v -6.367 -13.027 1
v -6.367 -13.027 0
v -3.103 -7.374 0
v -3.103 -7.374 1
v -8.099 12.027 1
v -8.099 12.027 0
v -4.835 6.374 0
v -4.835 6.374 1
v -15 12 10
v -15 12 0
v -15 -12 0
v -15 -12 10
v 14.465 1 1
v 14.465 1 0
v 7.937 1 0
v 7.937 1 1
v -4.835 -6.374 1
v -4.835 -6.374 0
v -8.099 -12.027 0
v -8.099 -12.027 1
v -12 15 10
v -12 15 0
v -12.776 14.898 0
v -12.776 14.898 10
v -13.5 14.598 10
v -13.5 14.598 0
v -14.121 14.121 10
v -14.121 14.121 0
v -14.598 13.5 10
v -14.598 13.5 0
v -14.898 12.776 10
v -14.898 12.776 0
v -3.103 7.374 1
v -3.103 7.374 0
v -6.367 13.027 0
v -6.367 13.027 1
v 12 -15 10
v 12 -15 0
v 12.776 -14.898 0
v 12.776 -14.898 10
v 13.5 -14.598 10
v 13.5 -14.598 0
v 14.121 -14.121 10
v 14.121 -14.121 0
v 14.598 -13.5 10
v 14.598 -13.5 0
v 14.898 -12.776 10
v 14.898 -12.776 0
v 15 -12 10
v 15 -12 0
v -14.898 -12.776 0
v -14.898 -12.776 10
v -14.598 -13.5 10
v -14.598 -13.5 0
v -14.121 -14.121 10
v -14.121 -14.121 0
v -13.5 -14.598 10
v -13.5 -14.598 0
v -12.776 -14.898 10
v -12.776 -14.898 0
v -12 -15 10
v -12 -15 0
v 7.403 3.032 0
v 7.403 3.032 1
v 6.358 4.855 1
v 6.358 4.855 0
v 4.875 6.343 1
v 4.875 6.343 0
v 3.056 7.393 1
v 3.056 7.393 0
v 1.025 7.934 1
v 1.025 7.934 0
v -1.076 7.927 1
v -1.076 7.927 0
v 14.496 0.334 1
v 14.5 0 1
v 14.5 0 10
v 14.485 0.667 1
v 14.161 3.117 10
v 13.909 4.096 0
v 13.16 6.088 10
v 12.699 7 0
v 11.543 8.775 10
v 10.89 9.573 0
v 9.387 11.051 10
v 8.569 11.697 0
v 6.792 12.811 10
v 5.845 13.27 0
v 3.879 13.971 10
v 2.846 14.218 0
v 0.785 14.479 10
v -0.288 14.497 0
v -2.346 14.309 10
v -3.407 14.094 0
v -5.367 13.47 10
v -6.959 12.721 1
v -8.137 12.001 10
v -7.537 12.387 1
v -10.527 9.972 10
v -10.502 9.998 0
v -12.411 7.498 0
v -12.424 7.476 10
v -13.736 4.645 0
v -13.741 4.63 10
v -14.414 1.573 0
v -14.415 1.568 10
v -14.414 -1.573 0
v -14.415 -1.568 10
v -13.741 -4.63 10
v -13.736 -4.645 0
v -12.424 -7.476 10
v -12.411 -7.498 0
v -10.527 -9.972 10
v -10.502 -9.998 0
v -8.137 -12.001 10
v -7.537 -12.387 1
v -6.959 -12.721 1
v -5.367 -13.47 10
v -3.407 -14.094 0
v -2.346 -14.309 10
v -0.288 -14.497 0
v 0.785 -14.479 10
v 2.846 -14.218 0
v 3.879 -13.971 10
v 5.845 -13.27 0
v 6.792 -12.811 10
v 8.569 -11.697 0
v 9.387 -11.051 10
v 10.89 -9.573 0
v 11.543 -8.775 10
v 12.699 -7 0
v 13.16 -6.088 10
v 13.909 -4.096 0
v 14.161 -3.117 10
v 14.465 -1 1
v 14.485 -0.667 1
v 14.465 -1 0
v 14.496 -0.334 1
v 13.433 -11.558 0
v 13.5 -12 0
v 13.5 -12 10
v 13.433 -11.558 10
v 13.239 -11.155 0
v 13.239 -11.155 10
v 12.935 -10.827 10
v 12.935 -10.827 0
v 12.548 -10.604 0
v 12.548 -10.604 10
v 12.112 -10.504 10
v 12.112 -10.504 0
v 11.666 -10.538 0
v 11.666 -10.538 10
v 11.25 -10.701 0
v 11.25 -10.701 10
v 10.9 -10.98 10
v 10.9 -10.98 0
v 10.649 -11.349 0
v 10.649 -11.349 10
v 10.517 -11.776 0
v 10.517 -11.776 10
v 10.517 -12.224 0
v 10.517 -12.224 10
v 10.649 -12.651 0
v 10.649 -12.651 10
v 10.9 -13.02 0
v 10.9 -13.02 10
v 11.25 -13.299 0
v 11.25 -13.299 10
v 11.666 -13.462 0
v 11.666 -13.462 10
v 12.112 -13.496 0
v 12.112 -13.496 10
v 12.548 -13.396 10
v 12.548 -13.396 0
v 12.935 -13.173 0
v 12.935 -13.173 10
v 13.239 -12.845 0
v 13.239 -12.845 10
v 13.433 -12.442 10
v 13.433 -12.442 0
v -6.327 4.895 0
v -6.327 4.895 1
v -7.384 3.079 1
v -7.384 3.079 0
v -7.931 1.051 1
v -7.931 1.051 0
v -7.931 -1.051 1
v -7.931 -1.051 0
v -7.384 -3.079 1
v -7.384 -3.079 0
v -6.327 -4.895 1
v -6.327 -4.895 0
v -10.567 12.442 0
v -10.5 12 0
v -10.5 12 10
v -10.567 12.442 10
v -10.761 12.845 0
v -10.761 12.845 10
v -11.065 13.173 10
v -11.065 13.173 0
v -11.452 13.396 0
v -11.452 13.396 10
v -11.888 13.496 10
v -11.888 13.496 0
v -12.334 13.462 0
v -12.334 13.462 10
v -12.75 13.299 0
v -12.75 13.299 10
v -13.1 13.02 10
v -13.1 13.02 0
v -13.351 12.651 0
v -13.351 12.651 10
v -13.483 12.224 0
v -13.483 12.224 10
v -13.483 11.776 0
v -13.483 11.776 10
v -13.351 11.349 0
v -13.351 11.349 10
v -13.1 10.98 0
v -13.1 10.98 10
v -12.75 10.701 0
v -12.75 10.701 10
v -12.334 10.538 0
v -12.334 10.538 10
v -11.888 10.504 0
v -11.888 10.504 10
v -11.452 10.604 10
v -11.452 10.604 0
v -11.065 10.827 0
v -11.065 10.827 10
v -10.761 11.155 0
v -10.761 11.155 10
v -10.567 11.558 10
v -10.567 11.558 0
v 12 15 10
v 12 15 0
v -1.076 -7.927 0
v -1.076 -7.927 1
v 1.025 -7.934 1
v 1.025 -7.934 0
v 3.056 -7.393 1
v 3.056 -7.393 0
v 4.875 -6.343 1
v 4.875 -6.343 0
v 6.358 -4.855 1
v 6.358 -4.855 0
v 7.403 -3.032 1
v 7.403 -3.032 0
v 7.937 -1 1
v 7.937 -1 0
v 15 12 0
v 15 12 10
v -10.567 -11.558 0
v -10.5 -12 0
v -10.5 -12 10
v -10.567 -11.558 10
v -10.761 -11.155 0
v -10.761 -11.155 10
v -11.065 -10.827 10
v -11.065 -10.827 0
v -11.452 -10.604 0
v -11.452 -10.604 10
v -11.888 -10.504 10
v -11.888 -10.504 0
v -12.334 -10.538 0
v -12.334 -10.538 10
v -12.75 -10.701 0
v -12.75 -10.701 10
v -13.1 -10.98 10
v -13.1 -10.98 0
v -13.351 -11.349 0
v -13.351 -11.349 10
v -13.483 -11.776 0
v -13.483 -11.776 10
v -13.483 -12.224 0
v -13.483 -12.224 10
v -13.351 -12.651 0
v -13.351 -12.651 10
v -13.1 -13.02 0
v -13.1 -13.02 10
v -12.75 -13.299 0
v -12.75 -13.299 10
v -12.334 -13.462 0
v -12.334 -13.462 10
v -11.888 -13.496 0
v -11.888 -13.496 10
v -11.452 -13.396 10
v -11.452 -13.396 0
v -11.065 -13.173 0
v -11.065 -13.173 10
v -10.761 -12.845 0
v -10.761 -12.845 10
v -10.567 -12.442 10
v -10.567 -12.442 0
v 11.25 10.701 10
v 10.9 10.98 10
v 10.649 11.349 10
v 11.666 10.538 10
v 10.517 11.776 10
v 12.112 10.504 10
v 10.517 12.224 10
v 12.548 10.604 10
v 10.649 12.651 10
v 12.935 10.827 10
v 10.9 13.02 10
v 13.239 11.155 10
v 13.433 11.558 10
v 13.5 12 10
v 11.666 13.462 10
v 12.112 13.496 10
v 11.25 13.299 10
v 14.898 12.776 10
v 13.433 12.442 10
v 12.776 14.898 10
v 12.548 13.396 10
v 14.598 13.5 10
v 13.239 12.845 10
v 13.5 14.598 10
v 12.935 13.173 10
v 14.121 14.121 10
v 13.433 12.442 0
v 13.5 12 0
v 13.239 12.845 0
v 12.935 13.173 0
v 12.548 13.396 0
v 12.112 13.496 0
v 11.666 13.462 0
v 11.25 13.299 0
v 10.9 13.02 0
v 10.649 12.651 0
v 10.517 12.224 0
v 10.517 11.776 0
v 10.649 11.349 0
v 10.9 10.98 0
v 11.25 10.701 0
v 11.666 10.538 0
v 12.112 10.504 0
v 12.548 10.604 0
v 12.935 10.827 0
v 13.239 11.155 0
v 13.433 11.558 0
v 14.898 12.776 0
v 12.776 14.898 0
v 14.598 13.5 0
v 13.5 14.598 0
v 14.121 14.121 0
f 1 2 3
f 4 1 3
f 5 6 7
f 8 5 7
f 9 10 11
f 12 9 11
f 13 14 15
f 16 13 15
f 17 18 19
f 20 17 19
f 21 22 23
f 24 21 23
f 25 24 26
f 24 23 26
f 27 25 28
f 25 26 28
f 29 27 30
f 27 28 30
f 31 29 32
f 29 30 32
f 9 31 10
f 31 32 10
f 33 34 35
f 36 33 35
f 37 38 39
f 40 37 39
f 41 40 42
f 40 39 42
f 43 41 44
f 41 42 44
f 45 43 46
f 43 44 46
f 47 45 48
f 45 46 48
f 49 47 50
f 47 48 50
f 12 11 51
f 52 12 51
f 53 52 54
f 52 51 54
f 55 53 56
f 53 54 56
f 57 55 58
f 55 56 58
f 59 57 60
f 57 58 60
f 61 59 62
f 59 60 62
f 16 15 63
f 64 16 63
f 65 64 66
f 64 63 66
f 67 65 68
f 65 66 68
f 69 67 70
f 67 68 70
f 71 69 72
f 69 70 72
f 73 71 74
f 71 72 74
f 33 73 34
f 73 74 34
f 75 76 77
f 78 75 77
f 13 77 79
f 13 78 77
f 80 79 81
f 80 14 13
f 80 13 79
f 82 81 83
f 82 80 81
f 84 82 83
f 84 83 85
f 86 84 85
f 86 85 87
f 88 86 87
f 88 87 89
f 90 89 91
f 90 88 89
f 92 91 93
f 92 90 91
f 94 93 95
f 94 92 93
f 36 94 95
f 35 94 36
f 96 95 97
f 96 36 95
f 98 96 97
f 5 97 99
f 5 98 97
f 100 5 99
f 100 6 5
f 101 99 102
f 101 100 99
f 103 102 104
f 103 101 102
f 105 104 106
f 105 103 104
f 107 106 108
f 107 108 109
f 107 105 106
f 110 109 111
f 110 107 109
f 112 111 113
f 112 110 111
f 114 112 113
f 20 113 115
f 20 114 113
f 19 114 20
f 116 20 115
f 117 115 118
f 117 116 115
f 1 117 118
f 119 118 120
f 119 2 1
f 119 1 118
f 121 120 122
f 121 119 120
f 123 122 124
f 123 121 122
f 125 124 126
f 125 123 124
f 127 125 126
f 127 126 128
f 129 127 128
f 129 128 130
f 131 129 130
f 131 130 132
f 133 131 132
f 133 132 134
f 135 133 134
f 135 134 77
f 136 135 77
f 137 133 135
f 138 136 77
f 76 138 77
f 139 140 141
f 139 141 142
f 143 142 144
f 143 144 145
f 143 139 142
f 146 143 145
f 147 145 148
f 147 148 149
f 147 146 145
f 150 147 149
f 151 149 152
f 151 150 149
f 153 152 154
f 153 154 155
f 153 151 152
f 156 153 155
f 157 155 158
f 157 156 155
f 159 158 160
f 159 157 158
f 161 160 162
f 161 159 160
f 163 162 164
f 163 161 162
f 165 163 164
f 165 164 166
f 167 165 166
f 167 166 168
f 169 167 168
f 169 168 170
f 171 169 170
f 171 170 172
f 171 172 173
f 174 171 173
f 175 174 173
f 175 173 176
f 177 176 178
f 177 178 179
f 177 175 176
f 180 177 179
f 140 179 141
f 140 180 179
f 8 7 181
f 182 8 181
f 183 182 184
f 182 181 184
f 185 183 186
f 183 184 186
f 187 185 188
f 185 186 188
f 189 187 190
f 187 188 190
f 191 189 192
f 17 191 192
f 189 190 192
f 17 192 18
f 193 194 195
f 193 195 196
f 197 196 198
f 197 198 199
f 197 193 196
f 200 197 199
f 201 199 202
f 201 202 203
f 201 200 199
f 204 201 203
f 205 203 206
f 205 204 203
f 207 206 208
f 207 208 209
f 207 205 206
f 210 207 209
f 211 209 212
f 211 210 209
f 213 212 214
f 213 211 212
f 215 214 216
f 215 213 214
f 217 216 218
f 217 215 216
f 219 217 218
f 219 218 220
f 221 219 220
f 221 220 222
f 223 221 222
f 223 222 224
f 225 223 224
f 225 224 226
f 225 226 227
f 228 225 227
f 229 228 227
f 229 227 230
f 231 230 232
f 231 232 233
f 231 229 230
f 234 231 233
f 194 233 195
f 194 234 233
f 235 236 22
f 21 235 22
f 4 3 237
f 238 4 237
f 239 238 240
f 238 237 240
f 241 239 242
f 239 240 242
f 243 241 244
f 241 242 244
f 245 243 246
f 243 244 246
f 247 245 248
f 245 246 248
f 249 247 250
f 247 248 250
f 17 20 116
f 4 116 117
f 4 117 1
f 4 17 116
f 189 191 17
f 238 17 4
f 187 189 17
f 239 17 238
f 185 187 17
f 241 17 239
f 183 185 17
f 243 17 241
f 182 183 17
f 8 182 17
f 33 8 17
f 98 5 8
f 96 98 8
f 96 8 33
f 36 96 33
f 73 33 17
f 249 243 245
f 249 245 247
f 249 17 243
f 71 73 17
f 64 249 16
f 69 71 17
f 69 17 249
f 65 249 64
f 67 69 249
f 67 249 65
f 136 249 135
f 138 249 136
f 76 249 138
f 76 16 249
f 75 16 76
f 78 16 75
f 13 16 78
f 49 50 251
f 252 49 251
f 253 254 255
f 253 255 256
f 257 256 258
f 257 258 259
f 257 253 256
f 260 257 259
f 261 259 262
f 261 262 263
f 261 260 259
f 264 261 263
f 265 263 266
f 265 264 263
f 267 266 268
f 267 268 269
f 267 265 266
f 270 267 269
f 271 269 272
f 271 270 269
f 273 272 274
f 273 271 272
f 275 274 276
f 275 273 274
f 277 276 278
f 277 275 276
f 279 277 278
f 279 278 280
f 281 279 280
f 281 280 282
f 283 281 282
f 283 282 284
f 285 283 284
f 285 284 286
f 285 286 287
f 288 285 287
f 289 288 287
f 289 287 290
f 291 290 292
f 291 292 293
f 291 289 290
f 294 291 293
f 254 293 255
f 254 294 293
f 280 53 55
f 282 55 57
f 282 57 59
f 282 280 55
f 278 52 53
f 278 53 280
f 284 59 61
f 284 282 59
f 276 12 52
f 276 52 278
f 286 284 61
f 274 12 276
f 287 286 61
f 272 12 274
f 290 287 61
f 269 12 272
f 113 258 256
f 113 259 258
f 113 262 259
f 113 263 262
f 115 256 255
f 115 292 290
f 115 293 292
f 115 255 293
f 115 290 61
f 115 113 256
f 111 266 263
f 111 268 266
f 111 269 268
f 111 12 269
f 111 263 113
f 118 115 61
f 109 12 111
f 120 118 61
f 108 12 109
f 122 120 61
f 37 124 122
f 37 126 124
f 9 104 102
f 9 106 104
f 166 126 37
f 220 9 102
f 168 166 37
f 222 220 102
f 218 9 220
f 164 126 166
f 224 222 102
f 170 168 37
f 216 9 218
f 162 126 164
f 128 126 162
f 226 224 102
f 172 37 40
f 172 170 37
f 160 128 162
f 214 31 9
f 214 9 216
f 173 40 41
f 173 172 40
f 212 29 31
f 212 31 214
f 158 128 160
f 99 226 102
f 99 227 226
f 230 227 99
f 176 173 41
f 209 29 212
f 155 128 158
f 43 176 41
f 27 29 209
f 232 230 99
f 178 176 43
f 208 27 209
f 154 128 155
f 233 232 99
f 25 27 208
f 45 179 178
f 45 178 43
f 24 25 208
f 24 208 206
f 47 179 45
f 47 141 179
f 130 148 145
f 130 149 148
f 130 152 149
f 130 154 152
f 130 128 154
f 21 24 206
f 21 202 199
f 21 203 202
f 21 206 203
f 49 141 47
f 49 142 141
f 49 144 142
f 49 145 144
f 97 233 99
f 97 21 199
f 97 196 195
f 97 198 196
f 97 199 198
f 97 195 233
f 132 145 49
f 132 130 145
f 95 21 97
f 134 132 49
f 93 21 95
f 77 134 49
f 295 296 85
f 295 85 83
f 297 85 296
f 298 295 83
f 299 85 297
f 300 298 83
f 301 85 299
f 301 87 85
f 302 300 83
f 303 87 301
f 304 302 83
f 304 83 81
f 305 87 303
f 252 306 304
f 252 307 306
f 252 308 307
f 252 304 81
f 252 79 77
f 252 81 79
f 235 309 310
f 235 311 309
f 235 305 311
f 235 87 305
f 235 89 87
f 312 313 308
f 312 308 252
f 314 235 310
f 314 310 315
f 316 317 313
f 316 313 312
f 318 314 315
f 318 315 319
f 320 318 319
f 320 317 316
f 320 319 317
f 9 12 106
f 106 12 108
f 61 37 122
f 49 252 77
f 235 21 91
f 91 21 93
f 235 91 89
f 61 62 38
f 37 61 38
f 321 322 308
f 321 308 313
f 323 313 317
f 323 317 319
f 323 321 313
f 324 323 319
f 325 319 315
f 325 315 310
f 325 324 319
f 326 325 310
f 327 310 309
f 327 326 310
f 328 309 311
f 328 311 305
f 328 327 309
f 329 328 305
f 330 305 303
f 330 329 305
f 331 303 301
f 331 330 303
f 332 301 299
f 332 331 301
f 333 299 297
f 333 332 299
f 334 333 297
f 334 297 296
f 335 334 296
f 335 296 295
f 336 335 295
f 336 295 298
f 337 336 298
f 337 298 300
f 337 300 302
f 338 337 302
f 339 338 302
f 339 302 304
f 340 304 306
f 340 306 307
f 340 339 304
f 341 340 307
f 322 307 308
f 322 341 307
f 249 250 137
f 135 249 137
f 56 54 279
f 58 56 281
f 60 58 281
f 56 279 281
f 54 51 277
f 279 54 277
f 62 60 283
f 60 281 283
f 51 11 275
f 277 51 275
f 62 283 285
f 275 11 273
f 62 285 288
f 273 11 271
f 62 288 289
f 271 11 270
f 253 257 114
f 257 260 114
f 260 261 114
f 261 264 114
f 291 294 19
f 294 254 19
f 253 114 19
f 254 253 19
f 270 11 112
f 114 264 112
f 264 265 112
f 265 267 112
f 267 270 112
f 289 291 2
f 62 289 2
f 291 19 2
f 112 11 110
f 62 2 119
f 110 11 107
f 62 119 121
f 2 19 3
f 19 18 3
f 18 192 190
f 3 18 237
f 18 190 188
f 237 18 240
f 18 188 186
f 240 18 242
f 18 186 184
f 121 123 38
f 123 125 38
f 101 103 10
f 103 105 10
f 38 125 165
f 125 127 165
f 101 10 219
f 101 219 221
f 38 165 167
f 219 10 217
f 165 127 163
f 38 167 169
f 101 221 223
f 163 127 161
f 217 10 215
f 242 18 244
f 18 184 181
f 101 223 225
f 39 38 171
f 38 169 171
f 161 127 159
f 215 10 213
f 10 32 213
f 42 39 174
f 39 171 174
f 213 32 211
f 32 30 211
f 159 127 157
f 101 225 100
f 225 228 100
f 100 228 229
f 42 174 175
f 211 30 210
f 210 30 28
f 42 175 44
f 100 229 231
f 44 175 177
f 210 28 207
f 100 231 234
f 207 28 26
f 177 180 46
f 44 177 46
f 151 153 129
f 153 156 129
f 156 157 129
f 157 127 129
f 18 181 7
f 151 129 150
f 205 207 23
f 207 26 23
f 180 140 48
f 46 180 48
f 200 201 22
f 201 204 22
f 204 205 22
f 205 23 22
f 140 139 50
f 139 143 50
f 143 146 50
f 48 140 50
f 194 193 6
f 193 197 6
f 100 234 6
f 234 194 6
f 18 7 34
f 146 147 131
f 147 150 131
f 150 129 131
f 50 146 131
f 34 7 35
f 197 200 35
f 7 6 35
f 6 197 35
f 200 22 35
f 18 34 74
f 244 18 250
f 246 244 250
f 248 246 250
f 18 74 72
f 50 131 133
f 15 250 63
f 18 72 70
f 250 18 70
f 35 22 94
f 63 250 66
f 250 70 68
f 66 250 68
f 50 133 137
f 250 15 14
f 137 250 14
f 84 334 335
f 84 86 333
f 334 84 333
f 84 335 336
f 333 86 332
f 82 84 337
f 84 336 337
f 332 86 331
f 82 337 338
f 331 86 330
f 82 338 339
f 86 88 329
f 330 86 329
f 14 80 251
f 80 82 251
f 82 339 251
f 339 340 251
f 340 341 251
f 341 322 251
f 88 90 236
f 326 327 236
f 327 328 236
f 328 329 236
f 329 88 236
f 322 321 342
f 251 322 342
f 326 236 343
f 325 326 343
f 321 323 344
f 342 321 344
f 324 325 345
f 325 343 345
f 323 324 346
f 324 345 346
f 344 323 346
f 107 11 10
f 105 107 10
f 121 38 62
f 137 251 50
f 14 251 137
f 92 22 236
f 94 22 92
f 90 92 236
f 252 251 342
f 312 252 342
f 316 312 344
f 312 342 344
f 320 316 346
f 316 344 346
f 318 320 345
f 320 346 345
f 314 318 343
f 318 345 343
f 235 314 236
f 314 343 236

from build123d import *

# Parameters (mm, degrees)
SKICA1_R                = 1.5
SKICA1_R_2              = 14.5
P_IDAT_VYSUNUT_M1_DEPTH = 10
SKICA2_R                = 8
P_IDAT_VYSUNUT_M2_DEPTH = 1


with BuildPart() as part:
    # Skica1 → Přidat vysunutím1 (new body)
    with BuildSketch(Plane.XY):
        with BuildLine():
            Line((-15, 12), (-15, 0))
            Line((-15, 0), (-15, -12))
            ThreePointArc((-15, -12), (-14.121320344, -14.121320344), (-12, -15))
            Line((-12, -15), (12, -15))
            ThreePointArc((12, -15), (14.121320344, -14.121320344), (15, -12))
            Line((15, -12), (15, 12))
            ThreePointArc((15, 12), (14.121320344, 14.121320344), (12, 15))
            Line((12, 15), (-12, 15))
            ThreePointArc((-12, 15), (-14.121320344, 14.121320344), (-15, 12))
        make_face()
        with Locations((-12, -12)):
            Circle(SKICA1_R, mode=Mode.SUBTRACT)
        with Locations((12, -12)):
            Circle(SKICA1_R, mode=Mode.SUBTRACT)
        with Locations((-12, 12)):
            Circle(SKICA1_R, mode=Mode.SUBTRACT)
        Circle(SKICA1_R_2, mode=Mode.SUBTRACT)
        with Locations((12, 12)):
            Circle(SKICA1_R, mode=Mode.SUBTRACT)
    extrude(amount=P_IDAT_VYSUNUT_M1_DEPTH)

    # Skica2 → Přidat vysunutím2 (add)
    with BuildSketch(Plane.XY):
        with BuildLine():
            ThreePointArc((-4.83465237, 6.373863542), (-4, 6.92820323), (-3.102601563, 7.373863542))
            Line((-3.102601563, 7.373863542), (-6.366712667, 13.027469816))
            ThreePointArc((-6.366712667, 13.027469816), (-7.25, 12.557368355), (-8.098763475, 12.027469816))
            Line((-8.098763475, 12.027469816), (-4.83465237, 6.373863542))
        make_face()
        Circle(SKICA2_R)
        with BuildLine():
            Line((14.465476141, 1), (7.937253933, 1))
            ThreePointArc((7.937253933, 1), (7.984298074, 0.5009833), (8, 0))
            ThreePointArc((8, 0), (7.984298074, -0.5009833), (7.937253933, -1))
            Line((7.937253933, -1), (14.465476141, -1))
            ThreePointArc((14.465476141, -1), (14.491366465, -0.500297885), (14.5, 0))
            ThreePointArc((14.5, 0), (14.491366465, 0.500297885), (14.465476141, 1))
        make_face()
        with BuildLine():
            Line((-6.366712667, -13.027469816), (-3.102601563, -7.373863542))
            ThreePointArc((-3.102601563, -7.373863542), (-4, -6.92820323), (-4.83465237, -6.373863542))
            Line((-4.83465237, -6.373863542), (-8.098763475, -12.027469816))
            ThreePointArc((-8.098763475, -12.027469816), (-7.25, -12.557368355), (-6.366712667, -13.027469816))
        make_face()
    extrude(amount=P_IDAT_VYSUNUT_M2_DEPTH)


solid = part.part
